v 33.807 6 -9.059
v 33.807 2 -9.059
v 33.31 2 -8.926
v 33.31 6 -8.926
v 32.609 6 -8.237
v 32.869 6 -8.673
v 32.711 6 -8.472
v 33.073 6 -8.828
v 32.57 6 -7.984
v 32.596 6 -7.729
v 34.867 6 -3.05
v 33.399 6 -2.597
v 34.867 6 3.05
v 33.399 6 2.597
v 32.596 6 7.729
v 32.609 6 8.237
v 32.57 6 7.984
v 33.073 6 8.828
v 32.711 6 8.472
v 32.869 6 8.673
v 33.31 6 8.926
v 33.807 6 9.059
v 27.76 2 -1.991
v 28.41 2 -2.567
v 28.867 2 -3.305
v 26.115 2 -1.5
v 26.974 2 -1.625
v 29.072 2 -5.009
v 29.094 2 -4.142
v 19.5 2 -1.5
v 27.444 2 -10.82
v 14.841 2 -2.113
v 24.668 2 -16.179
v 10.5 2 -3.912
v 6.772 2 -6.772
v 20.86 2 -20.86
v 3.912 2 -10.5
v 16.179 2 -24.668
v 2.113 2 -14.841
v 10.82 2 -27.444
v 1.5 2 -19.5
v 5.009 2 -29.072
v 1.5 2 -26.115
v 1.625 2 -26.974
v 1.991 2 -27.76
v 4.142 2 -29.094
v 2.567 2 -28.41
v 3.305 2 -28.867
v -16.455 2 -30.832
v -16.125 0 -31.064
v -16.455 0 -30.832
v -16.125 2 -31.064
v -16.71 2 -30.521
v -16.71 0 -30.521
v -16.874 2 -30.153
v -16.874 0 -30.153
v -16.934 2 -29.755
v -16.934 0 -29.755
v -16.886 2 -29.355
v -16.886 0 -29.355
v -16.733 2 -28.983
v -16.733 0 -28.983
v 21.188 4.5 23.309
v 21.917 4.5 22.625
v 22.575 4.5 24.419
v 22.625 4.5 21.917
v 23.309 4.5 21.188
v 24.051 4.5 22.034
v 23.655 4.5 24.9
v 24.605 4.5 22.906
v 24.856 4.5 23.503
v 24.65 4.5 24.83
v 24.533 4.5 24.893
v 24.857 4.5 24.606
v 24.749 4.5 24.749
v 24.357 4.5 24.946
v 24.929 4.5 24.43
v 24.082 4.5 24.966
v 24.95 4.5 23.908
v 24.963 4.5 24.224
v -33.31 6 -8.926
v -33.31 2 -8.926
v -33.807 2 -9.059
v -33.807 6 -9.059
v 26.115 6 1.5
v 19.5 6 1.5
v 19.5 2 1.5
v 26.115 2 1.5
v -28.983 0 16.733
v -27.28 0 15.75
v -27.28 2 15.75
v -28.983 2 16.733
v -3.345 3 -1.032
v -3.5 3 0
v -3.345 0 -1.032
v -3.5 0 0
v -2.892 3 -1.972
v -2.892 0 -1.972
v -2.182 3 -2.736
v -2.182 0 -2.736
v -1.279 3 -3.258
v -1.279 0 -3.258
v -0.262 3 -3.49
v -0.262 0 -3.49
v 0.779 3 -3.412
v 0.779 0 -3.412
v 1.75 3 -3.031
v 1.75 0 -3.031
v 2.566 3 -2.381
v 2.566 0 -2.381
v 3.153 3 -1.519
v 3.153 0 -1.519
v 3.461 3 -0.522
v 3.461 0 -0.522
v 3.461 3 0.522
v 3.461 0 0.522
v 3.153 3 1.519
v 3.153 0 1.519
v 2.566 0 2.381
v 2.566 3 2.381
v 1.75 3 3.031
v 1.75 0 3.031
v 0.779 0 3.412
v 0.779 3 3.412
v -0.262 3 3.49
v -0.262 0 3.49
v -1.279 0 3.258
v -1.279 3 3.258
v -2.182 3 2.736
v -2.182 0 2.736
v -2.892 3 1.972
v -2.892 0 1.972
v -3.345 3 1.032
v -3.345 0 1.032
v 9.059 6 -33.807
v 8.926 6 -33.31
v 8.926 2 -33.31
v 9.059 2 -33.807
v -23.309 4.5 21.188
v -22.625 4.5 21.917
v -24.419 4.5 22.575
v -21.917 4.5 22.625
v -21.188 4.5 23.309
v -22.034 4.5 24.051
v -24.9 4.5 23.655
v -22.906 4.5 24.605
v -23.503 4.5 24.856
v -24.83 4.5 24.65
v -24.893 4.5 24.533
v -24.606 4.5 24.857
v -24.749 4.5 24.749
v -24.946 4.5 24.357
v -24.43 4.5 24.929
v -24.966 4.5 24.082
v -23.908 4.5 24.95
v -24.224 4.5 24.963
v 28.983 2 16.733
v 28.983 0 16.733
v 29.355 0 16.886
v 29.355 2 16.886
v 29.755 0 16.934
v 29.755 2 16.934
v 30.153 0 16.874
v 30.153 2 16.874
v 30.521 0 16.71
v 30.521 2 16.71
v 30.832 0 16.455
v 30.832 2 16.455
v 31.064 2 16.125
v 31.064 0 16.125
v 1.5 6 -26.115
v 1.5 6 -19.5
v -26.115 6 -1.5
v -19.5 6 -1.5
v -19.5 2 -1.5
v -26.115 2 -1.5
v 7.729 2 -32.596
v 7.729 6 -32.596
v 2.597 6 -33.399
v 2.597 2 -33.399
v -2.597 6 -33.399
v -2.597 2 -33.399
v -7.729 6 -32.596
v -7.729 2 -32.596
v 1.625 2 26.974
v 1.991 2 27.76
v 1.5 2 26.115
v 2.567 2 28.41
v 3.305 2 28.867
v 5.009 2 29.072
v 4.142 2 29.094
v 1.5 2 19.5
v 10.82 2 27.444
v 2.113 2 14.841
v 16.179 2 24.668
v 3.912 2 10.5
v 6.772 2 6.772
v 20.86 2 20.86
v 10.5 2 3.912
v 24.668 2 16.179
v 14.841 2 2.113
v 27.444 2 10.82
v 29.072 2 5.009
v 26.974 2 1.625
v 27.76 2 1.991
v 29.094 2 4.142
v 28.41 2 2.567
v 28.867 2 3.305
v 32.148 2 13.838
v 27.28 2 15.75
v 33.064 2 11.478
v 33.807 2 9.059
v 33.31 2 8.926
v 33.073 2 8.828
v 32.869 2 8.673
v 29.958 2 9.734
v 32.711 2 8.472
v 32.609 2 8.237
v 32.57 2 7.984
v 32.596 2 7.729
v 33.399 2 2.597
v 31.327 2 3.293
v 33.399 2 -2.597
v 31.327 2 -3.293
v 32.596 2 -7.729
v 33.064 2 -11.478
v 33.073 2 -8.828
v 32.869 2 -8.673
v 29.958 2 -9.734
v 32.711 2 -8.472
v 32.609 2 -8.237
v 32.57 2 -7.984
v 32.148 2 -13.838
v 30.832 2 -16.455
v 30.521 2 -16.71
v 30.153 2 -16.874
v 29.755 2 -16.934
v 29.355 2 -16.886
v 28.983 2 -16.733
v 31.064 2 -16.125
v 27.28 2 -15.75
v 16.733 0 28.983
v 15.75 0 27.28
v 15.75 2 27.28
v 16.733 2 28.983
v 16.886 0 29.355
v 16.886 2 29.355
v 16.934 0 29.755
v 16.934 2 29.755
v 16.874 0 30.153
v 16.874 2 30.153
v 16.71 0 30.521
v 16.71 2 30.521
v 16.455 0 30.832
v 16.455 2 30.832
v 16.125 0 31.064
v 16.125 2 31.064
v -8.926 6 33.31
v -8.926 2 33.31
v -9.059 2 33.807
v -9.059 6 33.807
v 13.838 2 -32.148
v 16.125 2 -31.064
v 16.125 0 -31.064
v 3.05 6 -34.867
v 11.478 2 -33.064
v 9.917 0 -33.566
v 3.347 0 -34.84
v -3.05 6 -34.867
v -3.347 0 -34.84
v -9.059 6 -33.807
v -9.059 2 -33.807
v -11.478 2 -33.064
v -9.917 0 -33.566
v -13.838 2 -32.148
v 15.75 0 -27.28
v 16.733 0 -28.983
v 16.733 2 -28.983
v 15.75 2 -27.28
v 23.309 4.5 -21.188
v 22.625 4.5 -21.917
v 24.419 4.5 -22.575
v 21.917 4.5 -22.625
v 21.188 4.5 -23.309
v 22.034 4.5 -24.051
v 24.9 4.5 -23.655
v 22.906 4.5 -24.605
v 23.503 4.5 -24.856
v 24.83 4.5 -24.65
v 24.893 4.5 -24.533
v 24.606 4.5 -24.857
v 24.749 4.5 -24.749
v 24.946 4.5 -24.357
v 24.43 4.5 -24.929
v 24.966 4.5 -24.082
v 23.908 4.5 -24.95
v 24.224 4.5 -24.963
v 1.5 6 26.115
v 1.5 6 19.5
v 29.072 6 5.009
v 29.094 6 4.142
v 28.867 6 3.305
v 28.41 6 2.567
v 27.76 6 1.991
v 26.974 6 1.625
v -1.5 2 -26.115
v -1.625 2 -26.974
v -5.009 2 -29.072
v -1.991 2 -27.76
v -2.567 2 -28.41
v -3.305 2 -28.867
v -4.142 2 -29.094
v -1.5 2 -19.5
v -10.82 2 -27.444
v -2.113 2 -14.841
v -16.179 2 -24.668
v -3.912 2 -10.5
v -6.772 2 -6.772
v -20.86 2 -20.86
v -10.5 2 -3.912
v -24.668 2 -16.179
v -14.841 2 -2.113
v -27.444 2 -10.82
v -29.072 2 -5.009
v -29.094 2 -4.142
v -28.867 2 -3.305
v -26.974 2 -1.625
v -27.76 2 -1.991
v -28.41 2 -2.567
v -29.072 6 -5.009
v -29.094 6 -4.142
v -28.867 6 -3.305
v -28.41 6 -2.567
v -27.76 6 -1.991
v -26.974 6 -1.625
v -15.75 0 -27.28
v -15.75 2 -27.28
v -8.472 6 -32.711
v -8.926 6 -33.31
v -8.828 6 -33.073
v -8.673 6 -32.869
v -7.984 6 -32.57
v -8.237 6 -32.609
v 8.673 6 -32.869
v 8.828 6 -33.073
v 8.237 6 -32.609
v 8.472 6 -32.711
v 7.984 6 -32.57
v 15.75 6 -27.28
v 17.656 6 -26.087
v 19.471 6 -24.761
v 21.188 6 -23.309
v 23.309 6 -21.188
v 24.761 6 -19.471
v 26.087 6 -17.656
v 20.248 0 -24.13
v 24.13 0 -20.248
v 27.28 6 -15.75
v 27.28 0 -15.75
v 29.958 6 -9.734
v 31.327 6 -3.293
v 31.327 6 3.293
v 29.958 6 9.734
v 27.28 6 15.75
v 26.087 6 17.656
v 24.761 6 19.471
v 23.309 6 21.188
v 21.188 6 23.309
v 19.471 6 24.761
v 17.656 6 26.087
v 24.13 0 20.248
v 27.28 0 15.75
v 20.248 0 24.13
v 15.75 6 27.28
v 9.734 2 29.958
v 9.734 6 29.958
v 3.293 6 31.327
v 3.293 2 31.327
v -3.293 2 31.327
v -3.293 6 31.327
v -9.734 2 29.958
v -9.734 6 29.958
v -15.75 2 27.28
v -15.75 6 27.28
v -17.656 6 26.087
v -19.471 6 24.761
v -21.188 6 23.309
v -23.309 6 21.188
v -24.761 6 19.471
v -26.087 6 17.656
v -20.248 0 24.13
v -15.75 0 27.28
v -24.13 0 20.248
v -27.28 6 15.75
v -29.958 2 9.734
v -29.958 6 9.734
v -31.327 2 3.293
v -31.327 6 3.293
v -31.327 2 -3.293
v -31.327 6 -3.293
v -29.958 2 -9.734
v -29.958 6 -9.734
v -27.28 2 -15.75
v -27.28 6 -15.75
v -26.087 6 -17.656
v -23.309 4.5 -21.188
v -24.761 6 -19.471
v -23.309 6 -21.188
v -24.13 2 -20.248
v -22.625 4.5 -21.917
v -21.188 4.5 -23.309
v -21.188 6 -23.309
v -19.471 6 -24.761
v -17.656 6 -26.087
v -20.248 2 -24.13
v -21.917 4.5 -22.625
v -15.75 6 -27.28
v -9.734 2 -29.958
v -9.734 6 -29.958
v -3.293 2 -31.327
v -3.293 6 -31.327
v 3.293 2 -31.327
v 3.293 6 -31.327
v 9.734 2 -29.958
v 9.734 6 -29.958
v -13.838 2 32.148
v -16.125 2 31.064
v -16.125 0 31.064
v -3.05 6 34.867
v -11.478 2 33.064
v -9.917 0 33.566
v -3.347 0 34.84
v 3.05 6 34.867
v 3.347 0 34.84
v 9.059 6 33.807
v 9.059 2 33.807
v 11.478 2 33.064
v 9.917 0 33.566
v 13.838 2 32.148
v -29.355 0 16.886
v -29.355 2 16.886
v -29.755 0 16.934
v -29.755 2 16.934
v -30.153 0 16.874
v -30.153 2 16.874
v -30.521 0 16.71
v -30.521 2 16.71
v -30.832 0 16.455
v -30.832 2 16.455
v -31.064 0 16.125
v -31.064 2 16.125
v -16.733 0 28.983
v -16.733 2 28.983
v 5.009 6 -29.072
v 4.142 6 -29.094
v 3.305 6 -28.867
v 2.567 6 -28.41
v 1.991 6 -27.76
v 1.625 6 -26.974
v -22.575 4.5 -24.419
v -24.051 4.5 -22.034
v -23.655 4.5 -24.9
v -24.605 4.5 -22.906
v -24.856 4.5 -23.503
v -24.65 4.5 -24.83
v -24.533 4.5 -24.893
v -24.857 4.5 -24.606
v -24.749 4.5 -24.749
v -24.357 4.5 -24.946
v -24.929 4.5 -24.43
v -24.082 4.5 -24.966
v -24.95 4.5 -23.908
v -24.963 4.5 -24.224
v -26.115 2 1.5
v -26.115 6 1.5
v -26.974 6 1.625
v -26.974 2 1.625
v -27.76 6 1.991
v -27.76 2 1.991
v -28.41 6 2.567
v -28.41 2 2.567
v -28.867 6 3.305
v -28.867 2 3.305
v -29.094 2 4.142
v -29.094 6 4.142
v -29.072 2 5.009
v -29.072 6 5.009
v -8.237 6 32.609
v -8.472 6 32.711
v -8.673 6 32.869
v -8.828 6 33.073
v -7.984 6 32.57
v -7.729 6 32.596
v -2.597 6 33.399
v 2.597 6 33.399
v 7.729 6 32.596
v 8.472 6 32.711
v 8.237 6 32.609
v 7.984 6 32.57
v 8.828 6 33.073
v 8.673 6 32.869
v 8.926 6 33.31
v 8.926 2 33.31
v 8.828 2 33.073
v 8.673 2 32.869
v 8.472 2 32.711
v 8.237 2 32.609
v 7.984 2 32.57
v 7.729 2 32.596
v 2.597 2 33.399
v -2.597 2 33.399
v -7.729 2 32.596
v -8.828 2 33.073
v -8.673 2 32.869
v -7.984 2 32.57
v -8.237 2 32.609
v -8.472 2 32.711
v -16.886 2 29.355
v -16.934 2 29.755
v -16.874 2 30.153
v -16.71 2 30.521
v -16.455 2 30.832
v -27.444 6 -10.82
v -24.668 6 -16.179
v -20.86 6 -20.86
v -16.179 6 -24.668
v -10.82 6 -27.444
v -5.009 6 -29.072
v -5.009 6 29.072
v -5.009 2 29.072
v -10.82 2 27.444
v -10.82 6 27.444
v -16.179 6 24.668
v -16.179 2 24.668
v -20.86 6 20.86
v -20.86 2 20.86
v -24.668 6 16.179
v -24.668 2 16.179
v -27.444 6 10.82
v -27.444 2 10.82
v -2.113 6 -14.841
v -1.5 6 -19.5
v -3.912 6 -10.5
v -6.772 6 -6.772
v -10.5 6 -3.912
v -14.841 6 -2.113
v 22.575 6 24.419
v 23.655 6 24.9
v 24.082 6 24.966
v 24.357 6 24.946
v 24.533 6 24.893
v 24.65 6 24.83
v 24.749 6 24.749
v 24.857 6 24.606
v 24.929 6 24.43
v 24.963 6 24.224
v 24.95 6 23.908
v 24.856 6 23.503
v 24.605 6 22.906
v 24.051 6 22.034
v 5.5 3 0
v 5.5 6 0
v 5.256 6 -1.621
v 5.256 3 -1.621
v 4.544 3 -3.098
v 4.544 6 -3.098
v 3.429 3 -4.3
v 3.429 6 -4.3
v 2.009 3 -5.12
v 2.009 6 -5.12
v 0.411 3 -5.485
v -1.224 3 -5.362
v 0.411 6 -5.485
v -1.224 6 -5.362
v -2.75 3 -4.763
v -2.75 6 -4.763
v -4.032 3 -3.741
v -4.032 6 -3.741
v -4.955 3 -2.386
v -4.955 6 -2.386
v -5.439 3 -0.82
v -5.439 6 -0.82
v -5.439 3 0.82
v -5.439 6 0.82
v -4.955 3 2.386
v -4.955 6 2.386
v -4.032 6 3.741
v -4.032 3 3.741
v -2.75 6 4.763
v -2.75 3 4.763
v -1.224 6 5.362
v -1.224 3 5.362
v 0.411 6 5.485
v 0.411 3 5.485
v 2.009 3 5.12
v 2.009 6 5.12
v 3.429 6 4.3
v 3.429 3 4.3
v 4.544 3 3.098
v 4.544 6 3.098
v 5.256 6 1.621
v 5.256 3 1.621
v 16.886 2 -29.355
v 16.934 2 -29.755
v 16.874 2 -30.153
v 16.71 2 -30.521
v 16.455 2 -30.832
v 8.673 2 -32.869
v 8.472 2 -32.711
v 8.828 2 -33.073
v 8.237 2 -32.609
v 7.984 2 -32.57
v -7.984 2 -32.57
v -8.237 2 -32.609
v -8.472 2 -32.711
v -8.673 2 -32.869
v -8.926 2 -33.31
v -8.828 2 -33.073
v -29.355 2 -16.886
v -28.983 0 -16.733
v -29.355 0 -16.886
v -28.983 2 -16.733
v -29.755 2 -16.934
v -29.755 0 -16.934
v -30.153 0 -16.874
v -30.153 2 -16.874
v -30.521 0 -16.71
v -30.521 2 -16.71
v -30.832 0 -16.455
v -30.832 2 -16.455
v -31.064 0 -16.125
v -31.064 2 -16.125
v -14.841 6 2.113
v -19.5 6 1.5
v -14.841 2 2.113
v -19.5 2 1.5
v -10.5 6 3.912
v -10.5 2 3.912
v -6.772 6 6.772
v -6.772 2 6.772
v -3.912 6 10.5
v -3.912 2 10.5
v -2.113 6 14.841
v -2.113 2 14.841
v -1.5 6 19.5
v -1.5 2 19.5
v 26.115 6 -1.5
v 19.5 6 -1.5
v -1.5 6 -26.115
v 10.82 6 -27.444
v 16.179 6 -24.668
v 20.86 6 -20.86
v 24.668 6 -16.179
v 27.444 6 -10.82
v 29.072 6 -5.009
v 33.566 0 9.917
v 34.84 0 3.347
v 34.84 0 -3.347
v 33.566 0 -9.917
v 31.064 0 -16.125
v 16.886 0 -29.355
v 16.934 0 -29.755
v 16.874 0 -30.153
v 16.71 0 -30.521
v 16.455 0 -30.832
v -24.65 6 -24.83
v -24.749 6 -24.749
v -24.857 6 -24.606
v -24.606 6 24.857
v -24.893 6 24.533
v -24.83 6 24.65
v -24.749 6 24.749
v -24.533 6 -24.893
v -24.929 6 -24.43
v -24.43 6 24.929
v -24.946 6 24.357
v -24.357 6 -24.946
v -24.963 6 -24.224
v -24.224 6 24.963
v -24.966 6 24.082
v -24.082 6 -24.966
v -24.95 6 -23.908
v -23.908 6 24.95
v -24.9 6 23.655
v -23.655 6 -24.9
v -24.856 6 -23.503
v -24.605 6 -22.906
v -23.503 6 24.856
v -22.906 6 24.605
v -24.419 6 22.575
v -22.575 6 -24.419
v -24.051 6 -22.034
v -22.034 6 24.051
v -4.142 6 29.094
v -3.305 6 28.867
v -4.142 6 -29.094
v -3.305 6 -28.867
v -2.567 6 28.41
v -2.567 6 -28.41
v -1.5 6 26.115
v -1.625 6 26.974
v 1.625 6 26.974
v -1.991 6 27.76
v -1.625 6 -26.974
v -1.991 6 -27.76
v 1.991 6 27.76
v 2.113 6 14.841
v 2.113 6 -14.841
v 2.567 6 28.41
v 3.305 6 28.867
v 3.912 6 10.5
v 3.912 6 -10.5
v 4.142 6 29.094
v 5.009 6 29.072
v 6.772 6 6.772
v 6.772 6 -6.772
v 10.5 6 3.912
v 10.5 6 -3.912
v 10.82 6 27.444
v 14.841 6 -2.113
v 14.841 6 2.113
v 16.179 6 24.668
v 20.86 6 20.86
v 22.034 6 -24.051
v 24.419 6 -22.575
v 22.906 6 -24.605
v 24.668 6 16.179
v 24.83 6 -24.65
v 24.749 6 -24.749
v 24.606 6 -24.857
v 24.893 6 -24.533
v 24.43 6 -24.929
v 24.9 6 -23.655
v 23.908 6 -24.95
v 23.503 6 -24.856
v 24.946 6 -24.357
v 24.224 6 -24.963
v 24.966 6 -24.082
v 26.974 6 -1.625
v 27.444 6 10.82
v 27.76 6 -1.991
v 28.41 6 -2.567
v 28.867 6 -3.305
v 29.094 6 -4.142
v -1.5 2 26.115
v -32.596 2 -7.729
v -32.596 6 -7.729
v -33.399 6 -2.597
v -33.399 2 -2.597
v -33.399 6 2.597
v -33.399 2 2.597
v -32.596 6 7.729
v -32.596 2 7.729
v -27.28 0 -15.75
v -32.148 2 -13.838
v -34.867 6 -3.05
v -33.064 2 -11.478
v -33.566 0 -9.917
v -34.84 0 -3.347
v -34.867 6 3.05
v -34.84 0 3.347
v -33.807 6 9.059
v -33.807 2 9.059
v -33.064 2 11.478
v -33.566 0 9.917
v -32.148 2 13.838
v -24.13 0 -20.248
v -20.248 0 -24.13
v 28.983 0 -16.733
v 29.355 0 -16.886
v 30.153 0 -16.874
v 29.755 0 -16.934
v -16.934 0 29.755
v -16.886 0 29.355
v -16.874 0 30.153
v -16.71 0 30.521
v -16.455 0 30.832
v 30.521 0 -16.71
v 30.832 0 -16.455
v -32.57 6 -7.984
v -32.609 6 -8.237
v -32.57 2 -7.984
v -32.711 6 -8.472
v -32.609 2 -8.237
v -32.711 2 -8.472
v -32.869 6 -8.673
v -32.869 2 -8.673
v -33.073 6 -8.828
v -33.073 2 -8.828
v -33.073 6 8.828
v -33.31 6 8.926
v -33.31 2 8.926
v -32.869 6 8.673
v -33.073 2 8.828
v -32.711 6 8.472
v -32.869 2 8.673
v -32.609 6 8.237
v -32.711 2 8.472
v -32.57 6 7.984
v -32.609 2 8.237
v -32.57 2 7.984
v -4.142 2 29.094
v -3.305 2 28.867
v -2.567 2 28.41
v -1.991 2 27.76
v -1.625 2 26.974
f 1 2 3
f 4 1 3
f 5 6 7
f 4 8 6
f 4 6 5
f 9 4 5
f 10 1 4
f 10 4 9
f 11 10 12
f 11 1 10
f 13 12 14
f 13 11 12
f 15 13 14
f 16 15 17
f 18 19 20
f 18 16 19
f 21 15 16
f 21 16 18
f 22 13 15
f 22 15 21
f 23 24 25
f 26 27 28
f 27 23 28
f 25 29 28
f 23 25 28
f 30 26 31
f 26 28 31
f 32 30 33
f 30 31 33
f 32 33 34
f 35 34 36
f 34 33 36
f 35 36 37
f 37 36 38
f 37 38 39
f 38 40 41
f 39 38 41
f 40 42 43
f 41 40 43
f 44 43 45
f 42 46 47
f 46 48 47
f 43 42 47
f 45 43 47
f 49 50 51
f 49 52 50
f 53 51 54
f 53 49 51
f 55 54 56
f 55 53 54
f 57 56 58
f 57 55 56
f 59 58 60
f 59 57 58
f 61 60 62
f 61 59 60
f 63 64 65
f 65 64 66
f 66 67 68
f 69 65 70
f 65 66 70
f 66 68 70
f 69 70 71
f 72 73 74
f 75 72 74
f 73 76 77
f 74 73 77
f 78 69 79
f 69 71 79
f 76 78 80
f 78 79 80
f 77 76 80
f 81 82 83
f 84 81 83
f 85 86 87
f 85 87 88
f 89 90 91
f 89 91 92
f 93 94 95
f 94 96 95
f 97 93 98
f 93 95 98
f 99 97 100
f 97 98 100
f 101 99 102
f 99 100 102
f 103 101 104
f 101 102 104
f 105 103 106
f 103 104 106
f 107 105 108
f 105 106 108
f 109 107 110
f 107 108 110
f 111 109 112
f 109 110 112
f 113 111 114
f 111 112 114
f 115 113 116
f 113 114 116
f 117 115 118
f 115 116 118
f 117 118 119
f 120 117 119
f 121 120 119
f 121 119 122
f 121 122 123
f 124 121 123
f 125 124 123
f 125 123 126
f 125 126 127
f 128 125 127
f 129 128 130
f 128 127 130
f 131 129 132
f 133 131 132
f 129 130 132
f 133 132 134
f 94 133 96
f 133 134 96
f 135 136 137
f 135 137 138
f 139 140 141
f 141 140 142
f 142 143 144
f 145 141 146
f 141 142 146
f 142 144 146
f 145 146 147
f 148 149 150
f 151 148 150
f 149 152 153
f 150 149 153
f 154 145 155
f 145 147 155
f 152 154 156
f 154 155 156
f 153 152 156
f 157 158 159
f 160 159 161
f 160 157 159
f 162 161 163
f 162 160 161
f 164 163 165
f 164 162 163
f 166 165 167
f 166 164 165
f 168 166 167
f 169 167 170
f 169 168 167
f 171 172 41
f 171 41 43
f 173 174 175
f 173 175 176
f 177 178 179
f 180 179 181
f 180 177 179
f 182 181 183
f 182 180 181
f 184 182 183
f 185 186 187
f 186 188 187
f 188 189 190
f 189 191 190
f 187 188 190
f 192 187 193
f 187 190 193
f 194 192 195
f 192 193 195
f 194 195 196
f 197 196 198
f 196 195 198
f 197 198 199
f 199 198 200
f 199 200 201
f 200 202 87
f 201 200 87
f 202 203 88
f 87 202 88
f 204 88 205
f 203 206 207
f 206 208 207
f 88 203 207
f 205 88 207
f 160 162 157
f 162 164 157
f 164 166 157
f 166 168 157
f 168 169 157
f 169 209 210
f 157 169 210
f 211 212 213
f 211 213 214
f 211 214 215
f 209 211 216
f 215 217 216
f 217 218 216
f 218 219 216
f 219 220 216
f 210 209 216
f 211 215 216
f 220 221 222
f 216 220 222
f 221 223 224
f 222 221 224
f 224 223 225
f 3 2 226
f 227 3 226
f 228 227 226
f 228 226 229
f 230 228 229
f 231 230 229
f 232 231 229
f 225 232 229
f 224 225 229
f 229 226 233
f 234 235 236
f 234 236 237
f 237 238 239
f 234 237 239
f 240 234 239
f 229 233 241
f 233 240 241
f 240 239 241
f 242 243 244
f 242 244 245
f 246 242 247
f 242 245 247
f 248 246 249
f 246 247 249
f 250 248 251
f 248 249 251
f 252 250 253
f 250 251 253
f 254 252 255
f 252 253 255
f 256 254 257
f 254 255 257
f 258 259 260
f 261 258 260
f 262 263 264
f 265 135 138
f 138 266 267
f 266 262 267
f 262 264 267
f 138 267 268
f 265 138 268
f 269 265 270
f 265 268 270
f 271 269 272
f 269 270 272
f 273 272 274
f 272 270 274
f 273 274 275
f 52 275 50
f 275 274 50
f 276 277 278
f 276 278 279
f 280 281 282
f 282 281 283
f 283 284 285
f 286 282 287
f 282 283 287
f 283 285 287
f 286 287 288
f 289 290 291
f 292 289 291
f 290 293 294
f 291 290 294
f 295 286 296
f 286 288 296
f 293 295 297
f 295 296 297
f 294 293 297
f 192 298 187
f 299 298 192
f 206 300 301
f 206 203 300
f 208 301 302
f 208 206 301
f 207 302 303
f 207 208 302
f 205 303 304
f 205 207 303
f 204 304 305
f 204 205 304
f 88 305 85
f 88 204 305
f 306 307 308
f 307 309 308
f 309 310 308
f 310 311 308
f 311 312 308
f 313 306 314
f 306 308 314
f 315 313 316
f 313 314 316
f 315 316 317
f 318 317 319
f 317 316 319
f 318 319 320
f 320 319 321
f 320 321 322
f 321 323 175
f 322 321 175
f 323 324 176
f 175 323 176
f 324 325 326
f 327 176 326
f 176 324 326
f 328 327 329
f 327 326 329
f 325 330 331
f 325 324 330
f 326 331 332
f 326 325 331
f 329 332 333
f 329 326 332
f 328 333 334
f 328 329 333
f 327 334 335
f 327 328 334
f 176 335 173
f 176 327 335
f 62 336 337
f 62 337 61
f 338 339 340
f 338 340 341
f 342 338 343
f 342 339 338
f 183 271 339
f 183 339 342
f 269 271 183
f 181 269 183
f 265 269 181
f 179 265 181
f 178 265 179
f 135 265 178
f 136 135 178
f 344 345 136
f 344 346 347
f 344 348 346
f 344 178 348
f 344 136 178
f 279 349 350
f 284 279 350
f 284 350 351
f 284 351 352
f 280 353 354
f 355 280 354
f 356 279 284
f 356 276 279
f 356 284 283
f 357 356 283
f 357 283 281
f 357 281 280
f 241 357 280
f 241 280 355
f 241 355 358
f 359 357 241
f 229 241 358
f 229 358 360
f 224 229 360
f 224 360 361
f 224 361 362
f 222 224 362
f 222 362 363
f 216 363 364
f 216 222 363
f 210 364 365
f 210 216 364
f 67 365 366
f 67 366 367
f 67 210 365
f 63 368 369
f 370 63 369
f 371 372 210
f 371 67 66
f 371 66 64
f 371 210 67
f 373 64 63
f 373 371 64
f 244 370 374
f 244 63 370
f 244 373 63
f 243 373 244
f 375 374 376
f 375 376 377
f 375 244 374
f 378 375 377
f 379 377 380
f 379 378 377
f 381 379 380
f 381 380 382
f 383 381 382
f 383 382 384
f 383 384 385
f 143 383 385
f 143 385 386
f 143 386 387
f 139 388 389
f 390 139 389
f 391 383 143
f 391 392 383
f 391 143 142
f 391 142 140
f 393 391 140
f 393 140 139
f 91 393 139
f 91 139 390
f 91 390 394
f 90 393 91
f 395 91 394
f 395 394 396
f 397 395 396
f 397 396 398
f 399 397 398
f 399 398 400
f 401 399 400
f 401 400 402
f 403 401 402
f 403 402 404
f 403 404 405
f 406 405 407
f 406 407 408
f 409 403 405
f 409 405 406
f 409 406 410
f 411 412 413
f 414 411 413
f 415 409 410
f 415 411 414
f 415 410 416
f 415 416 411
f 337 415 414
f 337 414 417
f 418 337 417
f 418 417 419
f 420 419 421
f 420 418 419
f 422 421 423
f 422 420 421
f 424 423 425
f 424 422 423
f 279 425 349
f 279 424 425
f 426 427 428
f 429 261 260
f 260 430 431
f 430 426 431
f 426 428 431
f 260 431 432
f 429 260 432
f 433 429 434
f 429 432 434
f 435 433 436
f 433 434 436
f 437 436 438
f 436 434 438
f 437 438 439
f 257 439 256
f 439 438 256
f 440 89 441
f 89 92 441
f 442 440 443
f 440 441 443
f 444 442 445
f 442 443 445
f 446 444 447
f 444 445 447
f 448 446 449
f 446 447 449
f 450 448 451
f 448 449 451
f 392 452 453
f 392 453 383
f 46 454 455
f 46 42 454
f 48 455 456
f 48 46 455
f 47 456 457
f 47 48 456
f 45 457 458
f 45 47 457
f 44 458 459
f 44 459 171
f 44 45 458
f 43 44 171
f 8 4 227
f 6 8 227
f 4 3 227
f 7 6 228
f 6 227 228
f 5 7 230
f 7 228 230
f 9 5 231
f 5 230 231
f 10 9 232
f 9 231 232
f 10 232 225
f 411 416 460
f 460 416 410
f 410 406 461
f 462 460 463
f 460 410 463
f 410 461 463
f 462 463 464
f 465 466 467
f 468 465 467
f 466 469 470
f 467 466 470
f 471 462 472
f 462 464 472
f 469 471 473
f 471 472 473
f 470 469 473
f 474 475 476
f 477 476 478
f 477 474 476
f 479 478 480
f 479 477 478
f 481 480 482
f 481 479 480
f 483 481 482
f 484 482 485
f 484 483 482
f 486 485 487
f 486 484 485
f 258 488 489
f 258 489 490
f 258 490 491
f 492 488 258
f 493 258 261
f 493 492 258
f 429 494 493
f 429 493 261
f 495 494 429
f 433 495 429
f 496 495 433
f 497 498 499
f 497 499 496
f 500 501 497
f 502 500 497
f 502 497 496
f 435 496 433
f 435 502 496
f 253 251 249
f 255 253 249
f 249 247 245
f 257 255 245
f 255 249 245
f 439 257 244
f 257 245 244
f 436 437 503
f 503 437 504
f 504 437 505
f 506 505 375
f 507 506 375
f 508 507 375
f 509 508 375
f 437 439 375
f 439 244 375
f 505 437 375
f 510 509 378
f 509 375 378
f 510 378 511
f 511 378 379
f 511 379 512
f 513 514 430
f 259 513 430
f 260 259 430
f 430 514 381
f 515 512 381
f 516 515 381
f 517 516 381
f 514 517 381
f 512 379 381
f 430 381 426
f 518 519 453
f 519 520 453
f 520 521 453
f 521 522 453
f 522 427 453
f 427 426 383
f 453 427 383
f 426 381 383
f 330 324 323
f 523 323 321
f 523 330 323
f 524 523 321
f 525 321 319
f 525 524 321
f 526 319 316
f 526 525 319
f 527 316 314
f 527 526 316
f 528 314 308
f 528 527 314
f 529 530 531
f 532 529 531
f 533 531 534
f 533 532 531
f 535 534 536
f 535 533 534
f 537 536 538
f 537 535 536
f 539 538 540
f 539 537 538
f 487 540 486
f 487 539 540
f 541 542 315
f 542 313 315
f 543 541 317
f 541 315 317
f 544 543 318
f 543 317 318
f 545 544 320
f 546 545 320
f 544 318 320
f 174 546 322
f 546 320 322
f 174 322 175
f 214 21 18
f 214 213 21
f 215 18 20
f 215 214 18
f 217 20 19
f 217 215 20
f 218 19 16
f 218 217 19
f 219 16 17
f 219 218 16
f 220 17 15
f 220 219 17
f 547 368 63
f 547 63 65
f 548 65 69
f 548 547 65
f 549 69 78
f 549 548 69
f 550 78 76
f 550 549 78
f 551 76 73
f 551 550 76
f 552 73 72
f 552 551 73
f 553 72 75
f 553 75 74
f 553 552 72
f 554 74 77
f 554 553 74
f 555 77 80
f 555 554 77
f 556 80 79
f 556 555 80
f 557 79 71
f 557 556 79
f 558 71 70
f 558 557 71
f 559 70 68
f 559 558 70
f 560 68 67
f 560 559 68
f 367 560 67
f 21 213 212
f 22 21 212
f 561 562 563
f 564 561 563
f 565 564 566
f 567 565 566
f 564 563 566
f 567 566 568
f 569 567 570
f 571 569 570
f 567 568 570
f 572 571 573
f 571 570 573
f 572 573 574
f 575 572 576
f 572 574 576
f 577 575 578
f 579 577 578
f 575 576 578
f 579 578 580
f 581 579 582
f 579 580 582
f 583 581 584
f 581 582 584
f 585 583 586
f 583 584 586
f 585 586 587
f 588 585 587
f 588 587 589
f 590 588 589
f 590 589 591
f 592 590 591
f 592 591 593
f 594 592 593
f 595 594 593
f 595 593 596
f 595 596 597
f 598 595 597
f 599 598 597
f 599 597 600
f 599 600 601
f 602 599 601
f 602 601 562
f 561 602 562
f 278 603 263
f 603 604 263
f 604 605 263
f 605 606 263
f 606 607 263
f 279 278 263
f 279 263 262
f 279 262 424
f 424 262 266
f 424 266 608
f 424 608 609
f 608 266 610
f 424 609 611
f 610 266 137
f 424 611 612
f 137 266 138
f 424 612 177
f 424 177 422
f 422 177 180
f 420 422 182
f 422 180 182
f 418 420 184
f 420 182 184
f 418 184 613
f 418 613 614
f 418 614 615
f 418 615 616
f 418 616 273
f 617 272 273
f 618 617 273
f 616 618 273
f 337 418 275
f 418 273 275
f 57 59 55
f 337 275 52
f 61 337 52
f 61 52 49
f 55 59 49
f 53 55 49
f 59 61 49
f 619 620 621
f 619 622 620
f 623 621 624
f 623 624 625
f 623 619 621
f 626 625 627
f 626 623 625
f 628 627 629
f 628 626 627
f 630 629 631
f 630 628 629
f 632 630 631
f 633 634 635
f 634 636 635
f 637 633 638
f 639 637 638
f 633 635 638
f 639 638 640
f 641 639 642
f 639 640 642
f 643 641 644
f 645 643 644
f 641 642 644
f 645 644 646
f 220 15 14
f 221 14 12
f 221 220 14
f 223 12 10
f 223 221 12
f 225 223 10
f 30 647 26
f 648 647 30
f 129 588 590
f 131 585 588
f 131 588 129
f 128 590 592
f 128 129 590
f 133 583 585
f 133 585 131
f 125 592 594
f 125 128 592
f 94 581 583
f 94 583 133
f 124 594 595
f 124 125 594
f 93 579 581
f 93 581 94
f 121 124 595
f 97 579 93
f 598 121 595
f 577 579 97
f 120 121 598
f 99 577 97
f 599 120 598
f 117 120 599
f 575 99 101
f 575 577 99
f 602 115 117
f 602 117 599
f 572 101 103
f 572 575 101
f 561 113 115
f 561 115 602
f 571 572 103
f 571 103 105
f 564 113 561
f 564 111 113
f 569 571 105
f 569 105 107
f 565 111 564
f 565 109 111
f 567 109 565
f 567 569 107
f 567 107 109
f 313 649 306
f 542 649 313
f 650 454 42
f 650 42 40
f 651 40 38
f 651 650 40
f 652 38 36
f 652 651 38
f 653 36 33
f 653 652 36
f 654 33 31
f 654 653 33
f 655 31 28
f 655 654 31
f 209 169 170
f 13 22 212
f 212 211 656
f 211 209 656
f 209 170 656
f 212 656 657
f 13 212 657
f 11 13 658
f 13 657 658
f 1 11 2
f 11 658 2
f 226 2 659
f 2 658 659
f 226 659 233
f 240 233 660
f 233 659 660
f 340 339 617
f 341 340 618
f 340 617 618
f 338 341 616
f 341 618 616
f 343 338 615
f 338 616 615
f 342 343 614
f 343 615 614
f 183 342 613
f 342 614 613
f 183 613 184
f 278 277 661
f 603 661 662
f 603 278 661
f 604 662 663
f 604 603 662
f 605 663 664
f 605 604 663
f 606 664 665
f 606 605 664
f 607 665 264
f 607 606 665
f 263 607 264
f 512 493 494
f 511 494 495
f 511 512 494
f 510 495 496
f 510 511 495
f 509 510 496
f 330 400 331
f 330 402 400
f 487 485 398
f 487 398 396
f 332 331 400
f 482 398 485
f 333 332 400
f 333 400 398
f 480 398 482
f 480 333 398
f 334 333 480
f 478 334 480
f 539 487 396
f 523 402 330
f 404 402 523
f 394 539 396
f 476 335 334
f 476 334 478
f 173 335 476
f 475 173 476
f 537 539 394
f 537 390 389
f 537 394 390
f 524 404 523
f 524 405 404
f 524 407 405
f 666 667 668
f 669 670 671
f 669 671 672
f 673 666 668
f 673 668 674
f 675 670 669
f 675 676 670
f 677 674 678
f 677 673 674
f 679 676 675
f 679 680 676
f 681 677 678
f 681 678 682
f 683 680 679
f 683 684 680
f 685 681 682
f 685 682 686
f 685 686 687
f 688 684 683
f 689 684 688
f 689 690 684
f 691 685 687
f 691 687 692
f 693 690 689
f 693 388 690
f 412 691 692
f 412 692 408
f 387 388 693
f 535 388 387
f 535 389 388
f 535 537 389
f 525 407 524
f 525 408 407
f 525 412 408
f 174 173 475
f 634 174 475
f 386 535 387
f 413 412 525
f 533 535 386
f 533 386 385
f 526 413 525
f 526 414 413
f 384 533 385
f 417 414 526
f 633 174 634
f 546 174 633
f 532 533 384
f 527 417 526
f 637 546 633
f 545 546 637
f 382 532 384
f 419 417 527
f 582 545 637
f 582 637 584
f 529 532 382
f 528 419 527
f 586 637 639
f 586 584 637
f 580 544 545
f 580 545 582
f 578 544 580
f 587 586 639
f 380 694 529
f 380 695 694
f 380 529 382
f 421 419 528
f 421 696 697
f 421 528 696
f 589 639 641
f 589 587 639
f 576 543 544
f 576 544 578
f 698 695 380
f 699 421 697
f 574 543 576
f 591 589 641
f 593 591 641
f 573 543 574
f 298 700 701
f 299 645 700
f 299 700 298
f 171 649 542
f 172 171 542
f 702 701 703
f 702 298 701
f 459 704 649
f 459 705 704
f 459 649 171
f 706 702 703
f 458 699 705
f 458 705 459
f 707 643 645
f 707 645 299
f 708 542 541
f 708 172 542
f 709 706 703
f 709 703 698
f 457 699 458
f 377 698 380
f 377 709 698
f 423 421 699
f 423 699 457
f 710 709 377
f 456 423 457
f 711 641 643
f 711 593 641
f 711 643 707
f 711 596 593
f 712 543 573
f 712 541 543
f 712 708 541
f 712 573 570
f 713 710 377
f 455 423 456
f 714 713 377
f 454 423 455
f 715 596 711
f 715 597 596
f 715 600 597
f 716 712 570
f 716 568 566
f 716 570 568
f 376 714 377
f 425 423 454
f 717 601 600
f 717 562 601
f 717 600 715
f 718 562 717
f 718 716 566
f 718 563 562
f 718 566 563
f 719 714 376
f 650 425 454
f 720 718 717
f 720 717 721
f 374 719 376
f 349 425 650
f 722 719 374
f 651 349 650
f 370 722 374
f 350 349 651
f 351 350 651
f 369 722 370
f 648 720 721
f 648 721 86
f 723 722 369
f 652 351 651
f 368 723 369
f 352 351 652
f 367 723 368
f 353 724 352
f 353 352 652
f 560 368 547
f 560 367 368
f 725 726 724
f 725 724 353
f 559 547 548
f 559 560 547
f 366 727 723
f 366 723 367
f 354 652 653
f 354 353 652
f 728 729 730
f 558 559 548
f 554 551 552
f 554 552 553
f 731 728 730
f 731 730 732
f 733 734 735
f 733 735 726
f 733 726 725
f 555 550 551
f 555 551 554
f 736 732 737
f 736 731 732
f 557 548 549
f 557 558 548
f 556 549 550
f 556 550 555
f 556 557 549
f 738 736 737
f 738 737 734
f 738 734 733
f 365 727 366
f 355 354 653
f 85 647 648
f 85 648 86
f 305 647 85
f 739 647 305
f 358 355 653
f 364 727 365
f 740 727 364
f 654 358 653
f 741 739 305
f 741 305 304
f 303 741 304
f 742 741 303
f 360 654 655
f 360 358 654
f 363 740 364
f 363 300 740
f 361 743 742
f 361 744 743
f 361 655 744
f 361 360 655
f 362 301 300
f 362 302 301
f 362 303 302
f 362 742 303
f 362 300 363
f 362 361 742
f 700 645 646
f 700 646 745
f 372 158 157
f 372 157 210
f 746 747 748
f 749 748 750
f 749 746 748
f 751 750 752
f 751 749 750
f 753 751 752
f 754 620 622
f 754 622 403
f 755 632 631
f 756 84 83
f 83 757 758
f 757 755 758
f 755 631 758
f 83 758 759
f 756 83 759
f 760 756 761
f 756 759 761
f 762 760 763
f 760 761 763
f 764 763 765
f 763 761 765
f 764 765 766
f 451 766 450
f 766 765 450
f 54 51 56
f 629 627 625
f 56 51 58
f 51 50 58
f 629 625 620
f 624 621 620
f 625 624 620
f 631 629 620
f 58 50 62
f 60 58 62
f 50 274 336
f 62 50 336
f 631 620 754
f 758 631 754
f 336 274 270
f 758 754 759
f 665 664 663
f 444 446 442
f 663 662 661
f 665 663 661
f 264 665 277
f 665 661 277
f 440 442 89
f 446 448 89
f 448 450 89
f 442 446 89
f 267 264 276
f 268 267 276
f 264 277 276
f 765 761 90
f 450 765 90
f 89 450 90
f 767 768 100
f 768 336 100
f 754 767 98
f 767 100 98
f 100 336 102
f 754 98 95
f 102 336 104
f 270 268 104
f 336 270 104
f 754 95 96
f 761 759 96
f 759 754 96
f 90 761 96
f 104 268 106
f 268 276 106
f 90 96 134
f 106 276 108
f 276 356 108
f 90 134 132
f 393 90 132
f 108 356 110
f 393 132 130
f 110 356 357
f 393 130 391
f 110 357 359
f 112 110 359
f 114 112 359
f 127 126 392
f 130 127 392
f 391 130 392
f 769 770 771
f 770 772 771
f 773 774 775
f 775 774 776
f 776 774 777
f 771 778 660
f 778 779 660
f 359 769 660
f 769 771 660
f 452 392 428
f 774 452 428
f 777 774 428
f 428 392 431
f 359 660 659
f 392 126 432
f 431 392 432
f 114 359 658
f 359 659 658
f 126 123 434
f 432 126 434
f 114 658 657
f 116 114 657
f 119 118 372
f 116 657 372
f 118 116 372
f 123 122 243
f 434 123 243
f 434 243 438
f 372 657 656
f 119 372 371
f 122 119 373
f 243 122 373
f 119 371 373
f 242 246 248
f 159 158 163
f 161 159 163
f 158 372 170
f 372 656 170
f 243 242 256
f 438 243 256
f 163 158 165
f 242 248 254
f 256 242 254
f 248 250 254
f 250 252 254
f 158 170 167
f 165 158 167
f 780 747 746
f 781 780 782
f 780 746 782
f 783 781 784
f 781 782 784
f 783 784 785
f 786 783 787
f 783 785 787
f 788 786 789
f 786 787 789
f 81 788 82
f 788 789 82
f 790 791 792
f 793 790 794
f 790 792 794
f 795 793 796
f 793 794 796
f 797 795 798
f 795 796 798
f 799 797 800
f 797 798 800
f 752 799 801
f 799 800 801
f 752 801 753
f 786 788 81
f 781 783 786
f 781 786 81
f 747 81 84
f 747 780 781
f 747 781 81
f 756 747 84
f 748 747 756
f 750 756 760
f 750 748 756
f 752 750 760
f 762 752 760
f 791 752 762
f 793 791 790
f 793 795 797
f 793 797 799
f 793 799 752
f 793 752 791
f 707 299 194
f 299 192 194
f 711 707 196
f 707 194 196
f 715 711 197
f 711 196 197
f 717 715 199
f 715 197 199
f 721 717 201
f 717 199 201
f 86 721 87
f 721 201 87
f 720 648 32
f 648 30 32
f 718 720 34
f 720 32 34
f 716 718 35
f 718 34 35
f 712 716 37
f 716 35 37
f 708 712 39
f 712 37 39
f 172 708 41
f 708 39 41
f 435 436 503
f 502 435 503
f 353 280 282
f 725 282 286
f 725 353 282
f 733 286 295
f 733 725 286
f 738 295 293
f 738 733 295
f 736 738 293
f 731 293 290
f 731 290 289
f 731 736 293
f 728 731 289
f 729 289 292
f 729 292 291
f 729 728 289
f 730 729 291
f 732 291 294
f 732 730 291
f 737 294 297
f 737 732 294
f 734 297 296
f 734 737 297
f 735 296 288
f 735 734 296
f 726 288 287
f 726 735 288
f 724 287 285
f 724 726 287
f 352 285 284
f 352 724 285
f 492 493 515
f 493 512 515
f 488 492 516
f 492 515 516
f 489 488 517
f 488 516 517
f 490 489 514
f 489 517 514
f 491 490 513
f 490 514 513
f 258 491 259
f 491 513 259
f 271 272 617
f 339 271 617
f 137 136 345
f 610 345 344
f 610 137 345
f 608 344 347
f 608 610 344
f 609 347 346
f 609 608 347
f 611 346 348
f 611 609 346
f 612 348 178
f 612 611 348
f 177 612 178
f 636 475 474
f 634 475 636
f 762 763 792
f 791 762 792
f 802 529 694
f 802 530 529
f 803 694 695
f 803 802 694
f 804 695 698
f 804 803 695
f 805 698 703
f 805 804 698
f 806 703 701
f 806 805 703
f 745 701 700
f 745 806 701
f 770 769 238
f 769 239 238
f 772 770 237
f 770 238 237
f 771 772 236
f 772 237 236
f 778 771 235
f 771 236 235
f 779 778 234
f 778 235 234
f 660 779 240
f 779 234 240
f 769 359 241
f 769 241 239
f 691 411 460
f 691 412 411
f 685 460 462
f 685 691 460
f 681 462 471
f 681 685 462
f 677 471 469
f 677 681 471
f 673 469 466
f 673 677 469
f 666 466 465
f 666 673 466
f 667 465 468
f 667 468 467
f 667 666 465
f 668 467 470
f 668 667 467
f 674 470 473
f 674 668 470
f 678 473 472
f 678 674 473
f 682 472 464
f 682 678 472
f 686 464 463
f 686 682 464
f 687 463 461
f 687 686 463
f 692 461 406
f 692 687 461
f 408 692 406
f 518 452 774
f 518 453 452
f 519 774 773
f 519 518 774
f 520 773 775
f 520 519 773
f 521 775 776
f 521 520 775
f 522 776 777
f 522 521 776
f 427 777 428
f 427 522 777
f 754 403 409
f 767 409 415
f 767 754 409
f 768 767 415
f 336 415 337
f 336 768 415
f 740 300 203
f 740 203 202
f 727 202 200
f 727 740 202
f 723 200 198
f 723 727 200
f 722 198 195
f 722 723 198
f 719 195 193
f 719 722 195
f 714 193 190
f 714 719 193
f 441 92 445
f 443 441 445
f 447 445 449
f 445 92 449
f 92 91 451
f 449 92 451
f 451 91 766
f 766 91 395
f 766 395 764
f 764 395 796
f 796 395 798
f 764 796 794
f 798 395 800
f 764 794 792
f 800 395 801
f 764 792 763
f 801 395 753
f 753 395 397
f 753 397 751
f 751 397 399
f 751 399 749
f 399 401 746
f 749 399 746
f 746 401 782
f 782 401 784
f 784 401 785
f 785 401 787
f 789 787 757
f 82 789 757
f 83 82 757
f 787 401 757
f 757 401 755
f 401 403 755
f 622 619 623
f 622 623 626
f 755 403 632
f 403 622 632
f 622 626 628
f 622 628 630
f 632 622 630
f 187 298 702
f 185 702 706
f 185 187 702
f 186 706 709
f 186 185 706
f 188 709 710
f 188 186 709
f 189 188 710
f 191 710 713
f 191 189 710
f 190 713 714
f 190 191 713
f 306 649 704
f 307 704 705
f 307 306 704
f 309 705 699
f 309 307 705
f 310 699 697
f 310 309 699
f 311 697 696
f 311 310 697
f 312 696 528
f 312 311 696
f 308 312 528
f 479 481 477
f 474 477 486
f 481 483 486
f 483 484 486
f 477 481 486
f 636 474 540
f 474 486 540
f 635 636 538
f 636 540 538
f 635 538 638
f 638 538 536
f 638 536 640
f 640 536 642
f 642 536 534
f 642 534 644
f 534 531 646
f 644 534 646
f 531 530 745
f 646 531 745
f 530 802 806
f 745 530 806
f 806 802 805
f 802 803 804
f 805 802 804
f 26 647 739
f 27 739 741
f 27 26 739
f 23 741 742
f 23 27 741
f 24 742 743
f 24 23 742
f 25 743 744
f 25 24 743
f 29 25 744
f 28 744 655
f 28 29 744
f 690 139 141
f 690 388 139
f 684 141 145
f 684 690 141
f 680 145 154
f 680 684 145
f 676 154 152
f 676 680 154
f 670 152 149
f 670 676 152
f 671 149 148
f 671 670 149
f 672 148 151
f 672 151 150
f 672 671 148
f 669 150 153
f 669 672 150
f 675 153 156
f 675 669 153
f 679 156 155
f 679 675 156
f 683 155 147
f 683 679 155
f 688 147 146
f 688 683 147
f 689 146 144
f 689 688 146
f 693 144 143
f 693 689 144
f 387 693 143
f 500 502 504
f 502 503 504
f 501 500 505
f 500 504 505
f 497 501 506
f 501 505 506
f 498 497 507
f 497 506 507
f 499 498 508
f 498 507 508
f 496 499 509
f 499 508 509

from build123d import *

# Parameters (mm, degrees)
SKETCH1_R                                           = 35
BOSS_EXTRUDE1_DEPTH                                 = 2
SKETCH2_R                                           = 31.5
BOSS_EXTRUDE2_DEPTH                                 = 4
SKETCH4_R                                           = 35
SKETCH4_R_2                                         = 33.5
BOSS_EXTRUDE3_DEPTH                                 = 4
CUT_EXTRUDE2_START                                  = -6
CUT_EXTRUDE2_DEPTH                                  = 6
CUT_EXTRUDE3_START                                  = -4
CUT_EXTRUDE3_DEPTH                                  = 4
SKETCH7_RX                                          = 3.5
SKETCH7_RY                                          = 1.5
BOSS_EXTRUDE4_DEPTH                                 = 1.5
CUT_EXTRUDE1_DEPTH                                  = 4
FILLET1_R                                           = 18
FILLET2_R                                           = 3
FILLET3_R                                           = 1.5
FILLET4_R                                           = 1
CIRPATTERN1_COUNT                                   = 4
FILLET1_OF_CIRPATTERN1_R                            = 18
FILLET2_OF_CIRPATTERN1_R                            = 3
FILLET3_OF_CIRPATTERN1_R                            = 1.5
FILLET4_OF_CIRPATTERN1_R                            = 1
CBORE_FOR_M6_HEX_SOCKET_HEAD_CAP_SCREW1_D           = 7
CBORE_FOR_M6_HEX_SOCKET_HEAD_CAP_SCREW1_CBORE_D     = 11
CBORE_FOR_M6_HEX_SOCKET_HEAD_CAP_SCREW1_CBORE_DEPTH = 3


# Read off the part's stored shape, not the designer's step: Cut-Extrude2
with BuildPart() as part:
    # Sketch1 → Boss-Extrude1 (new body)
    with BuildSketch(Plane(origin=(0, 0, 0), x_dir=(1, 0, 0), z_dir=(0, 1, 0))):
        with Locations(Location((0, 0, 0), (0, 0, 270))):
            Circle(SKETCH1_R)
    extrude(amount=BOSS_EXTRUDE1_DEPTH)

    # Sketch2 → Boss-Extrude2 (add)
    with BuildSketch(Plane(origin=(0, 2, 0), x_dir=(1, 0, 0), z_dir=(0, 1, 0))):
        with Locations(Location((0, 0, 0), (0, 0, 270))):
            Circle(SKETCH2_R)
    extrude(amount=BOSS_EXTRUDE2_DEPTH)

    # Sketch4 → Boss-Extrude3 (add)
    with BuildSketch(Plane(origin=(0, 2, 0), x_dir=(1, 0, 0), z_dir=(0, 1, 0))):
        with Locations(Location((0, 0, 0), (0, 0, 270))):
            Circle(SKETCH4_R)
        with Locations(Location((0, 0, 0), (0, 0, 270))):
            Circle(SKETCH4_R_2, mode=Mode.SUBTRACT)
    extrude(amount=BOSS_EXTRUDE3_DEPTH)

    # Cut-Extrude2 outline → Cut-Extrude2 (cut)
    with BuildSketch(Plane(origin=(0, 6, 0), x_dir=(1, 0, 0), z_dir=(0, 1, 0)).offset(CUT_EXTRUDE2_START)):
        with BuildLine():
            ThreePointArc((30.310889132, 17.5), (24.748737342, 24.748737342), (17.5, 30.310889132))
            Line((17.5, 30.310889132), (15.75, 27.279800219))
            ThreePointArc((15.75, 27.279800219), (22.273863607, 22.273863607), (27.279800219, 15.75))
            Line((27.279800219, 15.75), (30.310889132, 17.5))
        make_face()
    cut_extrude2 = extrude(amount=CUT_EXTRUDE2_DEPTH, mode=Mode.SUBTRACT)

    # Sketch6 → Cut-Extrude3 (cut)
    with BuildSketch(Plane(origin=(0, 6, 0), x_dir=(1, 0, 0), z_dir=(0, 1, 0)).offset(CUT_EXTRUDE3_START)):
        with BuildLine():
            Line((8.152799921, 30.426663528), (9.058666579, 33.80740392))
            ThreePointArc((9.058666579, 33.80740392), (24.748737342, 24.748737342), (33.80740392, 9.058666579))
            Line((33.80740392, 9.058666579), (30.426663528, 8.152799921))
            ThreePointArc((30.426663528, 8.152799921), (22.273863607, 22.273863607), (8.152799921, 30.426663528))
        make_face()
    cut_extrude3 = extrude(amount=CUT_EXTRUDE3_DEPTH, mode=Mode.SUBTRACT)

    # Sketch7 → Boss-Extrude4 (add)
    with BuildSketch(Plane(origin=(0, 6, 0), x_dir=(1, 0, 0), z_dir=(0, 1, 0))):
        with Locations(Location((22.273863607, 22.273863607), (0, 0, 45))):
            Ellipse(SKETCH7_RX, SKETCH7_RY)
    boss_extrude4 = extrude(amount=-BOSS_EXTRUDE4_DEPTH)

    # Sketch3 → Cut-Extrude1 (cut)
    with BuildSketch(Plane(origin=(0, 6, 0), x_dir=(1, 0, 0), z_dir=(0, 1, 0))):
        with BuildLine():
            Line((1.5, 1.5), (1.5, 29.461839725))
            ThreePointArc((1.5, 29.461839725), (20.859650045, 20.859650045), (29.461839725, 1.5))
            Line((29.461839725, 1.5), (1.5, 1.5))
        make_face()
    cut_extrude1 = extrude(amount=-CUT_EXTRUDE1_DEPTH, mode=Mode.SUBTRACT)

    # Fillet1
    fillet1_edges = [part.edges().sort_by_distance(p)[0] for p in [
        (1.5, 4, -1.5),
    ]]
    fillet(fillet1_edges, radius=FILLET1_R)

    # Fillet2
    fillet2_edges = [part.edges().sort_by_distance(p)[0] for p in [
        (29.461839725, 4, -1.5),
        (1.5, 4, -29.461839725),
    ]]
    fillet(fillet2_edges, radius=FILLET2_R)

    # Fillet3
    fillet3_edges = [part.edges().sort_by_distance(p)[0] for p in [
        (17.5, 1, -30.310889132),
        (30.310889132, 1, -17.5),
    ]]
    fillet(fillet3_edges, radius=FILLET3_R)

    # Fillet4
    fillet4_edges = [part.edges().sort_by_distance(p)[0] for p in [
        (8.670438011, 4, -32.358515181),
        (32.358515181, 4, -8.670438011),
    ]]
    fillet(fillet4_edges, radius=FILLET4_R)

    # CirPattern1: Cut-Extrude2, Cut-Extrude3, Boss-Extrude4, Cut-Extrude1 ×4 about axis
    cirpattern1_axis = Axis((0, 6, 0), (0, -1, 0))
    add([cut_extrude2.rotate(cirpattern1_axis, i * 360 / CIRPATTERN1_COUNT) for i in range(1, CIRPATTERN1_COUNT)], mode=Mode.SUBTRACT)
    add([cut_extrude3.rotate(cirpattern1_axis, i * 360 / CIRPATTERN1_COUNT) for i in range(1, CIRPATTERN1_COUNT)], mode=Mode.SUBTRACT)
    add([boss_extrude4.rotate(cirpattern1_axis, i * 360 / CIRPATTERN1_COUNT) for i in range(1, CIRPATTERN1_COUNT)])
    add([cut_extrude1.rotate(cirpattern1_axis, i * 360 / CIRPATTERN1_COUNT) for i in range(1, CIRPATTERN1_COUNT)], mode=Mode.SUBTRACT)

    # Fillet1 of CirPattern1
    fillet1_of_cirpattern1_edges = [part.edges().sort_by_distance(p)[0] for p in [
        (1.5, 4, 1.5),
        (-1.5, 4, 1.5),
        (-1.5, 4, -1.5),
    ]]
    fillet(fillet1_of_cirpattern1_edges, radius=FILLET1_OF_CIRPATTERN1_R)

    # Fillet2 of CirPattern1
    fillet2_of_cirpattern1_edges = [part.edges().sort_by_distance(p)[0] for p in [
        (1.5, 4, 29.461839725),
        (29.461839725, 4, 1.5),
        (-29.461839725, 4, 1.5),
        (-1.5, 4, 29.461839725),
        (-1.5, 4, -29.461839725),
        (-29.461839725, 4, -1.5),
    ]]
    fillet(fillet2_of_cirpattern1_edges, radius=FILLET2_OF_CIRPATTERN1_R)

    # Fillet3 of CirPattern1
    fillet3_of_cirpattern1_edges = [part.edges().sort_by_distance(p)[0] for p in [
        (30.310889132, 1, 17.5),
        (17.5, 1, 30.310889132),
        (-17.5, 1, 30.310889132),
        (-30.310889132, 1, 17.5),
        (-30.310889132, 1, -17.5),
        (-17.5, 1, -30.310889132),
    ]]
    fillet(fillet3_of_cirpattern1_edges, radius=FILLET3_OF_CIRPATTERN1_R)

    # Fillet4 of CirPattern1
    fillet4_of_cirpattern1_edges = [part.edges().sort_by_distance(p)[0] for p in [
        (32.358515181, 4, 8.670438011),
        (8.670438011, 4, 32.358515181),
        (-8.670438011, 4, 32.358515181),
        (-32.358515181, 4, 8.670438011),
        (-32.358515181, 4, -8.670438011),
        (-8.670438011, 4, -32.358515181),
    ]]
    fillet(fillet4_of_cirpattern1_edges, radius=FILLET4_OF_CIRPATTERN1_R)

    # CBORE for M6 Hex Socket Head Cap Screw1 (through all)
    with Locations(Plane(origin=(0, 6, 0), x_dir=(1, 0, 0), z_dir=(0, 1, 0))):
        with Locations((0, 0)):
            CounterBoreHole(CBORE_FOR_M6_HEX_SOCKET_HEAD_CAP_SCREW1_D / 2, CBORE_FOR_M6_HEX_SOCKET_HEAD_CAP_SCREW1_CBORE_D / 2, CBORE_FOR_M6_HEX_SOCKET_HEAD_CAP_SCREW1_CBORE_DEPTH)


solid = part.part
